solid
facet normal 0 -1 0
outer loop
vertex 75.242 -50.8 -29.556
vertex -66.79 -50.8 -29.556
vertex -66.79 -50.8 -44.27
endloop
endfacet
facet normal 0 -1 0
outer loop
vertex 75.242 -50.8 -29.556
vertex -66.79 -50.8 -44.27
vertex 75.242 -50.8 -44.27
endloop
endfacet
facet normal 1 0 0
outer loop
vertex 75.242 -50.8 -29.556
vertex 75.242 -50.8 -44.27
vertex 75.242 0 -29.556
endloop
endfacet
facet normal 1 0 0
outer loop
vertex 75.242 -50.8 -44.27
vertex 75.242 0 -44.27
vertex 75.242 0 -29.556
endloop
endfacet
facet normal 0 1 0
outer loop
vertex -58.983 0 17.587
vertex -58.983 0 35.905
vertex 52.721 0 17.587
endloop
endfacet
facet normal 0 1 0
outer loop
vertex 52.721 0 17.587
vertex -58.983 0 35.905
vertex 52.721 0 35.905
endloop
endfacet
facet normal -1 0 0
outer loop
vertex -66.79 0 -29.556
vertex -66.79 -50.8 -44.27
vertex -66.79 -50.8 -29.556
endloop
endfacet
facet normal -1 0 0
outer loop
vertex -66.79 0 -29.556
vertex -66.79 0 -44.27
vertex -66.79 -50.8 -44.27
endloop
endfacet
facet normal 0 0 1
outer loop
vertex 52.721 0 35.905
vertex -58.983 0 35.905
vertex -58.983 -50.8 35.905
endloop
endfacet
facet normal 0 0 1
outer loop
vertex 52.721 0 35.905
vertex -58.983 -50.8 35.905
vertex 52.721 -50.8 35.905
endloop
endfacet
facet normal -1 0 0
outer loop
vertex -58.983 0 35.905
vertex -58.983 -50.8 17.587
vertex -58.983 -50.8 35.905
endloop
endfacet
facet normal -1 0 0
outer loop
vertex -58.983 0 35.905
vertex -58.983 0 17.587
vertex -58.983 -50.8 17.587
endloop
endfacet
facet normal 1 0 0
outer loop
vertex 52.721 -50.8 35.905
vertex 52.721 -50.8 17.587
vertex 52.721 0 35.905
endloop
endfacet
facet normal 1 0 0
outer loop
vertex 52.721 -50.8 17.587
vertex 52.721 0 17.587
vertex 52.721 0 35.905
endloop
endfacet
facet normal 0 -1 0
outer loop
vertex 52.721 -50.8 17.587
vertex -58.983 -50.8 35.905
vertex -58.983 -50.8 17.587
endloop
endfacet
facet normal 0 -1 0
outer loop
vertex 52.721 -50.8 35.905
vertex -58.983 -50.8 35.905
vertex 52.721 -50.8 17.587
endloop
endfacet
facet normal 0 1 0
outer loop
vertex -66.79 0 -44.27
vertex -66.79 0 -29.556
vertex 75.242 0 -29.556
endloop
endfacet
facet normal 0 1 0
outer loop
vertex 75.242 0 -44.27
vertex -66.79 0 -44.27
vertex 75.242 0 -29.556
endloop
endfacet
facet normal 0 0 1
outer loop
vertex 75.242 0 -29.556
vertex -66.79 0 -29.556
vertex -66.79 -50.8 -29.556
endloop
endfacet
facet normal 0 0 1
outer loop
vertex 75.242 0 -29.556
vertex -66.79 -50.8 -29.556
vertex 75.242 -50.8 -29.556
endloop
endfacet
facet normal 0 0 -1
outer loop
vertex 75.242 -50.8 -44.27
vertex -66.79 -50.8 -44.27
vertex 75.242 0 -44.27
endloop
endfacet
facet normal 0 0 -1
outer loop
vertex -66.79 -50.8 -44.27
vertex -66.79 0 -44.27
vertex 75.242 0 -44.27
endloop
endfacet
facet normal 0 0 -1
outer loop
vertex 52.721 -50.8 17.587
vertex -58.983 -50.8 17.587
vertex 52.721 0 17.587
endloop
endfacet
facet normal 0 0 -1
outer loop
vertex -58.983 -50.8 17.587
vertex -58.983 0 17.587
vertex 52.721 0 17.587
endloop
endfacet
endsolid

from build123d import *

# Parameters (mm, degrees)
F0_W      = 111.704126
F0_H      = 18.317076
F1_DEPTH  = 25.4
F1_FACE_W = 111.704126
F1_FACE_H = 18.317076
F2_DEPTH  = 25.4
F3_W      = 142.0324
F3_H      = 14.713718
F4_DEPTH  = 25.4
F4_FACE_W = 142.0324
F4_FACE_H = 14.713718
F5_DEPTH  = 25.4


with BuildPart() as f1:
    # F0 (on Front) → F1 (new body)
    with BuildSketch(Plane.XZ):
        with Locations((-3.130823, 26.745989)):
            Rectangle(F0_W, F0_H)
    extrude(amount=F1_DEPTH)

    # F1_face (on face) → F2 (join)
    with BuildSketch(Plane(origin=(-3.130823, -25.4, 26.745989), x_dir=(1, 0, 0), z_dir=(0, -1, 0))):
        Rectangle(F1_FACE_W, F1_FACE_H)
    extrude(amount=F2_DEPTH)


with BuildPart() as f4:
    # F3 (on Front) → F4 (new body)
    with BuildSketch(Plane.XZ):
        with Locations((4.226036, -36.913355)):
            Rectangle(F3_W, F3_H)
    extrude(amount=F4_DEPTH)

    # F4_face (on face) → F5 (join)
    with BuildSketch(Plane(origin=(4.226036, -25.4, -36.913355), x_dir=(1, 0, 0), z_dir=(0, -1, 0))):
        Rectangle(F4_FACE_W, F4_FACE_H)
    extrude(amount=F5_DEPTH)


solid = Compound([f1.part, f4.part])
